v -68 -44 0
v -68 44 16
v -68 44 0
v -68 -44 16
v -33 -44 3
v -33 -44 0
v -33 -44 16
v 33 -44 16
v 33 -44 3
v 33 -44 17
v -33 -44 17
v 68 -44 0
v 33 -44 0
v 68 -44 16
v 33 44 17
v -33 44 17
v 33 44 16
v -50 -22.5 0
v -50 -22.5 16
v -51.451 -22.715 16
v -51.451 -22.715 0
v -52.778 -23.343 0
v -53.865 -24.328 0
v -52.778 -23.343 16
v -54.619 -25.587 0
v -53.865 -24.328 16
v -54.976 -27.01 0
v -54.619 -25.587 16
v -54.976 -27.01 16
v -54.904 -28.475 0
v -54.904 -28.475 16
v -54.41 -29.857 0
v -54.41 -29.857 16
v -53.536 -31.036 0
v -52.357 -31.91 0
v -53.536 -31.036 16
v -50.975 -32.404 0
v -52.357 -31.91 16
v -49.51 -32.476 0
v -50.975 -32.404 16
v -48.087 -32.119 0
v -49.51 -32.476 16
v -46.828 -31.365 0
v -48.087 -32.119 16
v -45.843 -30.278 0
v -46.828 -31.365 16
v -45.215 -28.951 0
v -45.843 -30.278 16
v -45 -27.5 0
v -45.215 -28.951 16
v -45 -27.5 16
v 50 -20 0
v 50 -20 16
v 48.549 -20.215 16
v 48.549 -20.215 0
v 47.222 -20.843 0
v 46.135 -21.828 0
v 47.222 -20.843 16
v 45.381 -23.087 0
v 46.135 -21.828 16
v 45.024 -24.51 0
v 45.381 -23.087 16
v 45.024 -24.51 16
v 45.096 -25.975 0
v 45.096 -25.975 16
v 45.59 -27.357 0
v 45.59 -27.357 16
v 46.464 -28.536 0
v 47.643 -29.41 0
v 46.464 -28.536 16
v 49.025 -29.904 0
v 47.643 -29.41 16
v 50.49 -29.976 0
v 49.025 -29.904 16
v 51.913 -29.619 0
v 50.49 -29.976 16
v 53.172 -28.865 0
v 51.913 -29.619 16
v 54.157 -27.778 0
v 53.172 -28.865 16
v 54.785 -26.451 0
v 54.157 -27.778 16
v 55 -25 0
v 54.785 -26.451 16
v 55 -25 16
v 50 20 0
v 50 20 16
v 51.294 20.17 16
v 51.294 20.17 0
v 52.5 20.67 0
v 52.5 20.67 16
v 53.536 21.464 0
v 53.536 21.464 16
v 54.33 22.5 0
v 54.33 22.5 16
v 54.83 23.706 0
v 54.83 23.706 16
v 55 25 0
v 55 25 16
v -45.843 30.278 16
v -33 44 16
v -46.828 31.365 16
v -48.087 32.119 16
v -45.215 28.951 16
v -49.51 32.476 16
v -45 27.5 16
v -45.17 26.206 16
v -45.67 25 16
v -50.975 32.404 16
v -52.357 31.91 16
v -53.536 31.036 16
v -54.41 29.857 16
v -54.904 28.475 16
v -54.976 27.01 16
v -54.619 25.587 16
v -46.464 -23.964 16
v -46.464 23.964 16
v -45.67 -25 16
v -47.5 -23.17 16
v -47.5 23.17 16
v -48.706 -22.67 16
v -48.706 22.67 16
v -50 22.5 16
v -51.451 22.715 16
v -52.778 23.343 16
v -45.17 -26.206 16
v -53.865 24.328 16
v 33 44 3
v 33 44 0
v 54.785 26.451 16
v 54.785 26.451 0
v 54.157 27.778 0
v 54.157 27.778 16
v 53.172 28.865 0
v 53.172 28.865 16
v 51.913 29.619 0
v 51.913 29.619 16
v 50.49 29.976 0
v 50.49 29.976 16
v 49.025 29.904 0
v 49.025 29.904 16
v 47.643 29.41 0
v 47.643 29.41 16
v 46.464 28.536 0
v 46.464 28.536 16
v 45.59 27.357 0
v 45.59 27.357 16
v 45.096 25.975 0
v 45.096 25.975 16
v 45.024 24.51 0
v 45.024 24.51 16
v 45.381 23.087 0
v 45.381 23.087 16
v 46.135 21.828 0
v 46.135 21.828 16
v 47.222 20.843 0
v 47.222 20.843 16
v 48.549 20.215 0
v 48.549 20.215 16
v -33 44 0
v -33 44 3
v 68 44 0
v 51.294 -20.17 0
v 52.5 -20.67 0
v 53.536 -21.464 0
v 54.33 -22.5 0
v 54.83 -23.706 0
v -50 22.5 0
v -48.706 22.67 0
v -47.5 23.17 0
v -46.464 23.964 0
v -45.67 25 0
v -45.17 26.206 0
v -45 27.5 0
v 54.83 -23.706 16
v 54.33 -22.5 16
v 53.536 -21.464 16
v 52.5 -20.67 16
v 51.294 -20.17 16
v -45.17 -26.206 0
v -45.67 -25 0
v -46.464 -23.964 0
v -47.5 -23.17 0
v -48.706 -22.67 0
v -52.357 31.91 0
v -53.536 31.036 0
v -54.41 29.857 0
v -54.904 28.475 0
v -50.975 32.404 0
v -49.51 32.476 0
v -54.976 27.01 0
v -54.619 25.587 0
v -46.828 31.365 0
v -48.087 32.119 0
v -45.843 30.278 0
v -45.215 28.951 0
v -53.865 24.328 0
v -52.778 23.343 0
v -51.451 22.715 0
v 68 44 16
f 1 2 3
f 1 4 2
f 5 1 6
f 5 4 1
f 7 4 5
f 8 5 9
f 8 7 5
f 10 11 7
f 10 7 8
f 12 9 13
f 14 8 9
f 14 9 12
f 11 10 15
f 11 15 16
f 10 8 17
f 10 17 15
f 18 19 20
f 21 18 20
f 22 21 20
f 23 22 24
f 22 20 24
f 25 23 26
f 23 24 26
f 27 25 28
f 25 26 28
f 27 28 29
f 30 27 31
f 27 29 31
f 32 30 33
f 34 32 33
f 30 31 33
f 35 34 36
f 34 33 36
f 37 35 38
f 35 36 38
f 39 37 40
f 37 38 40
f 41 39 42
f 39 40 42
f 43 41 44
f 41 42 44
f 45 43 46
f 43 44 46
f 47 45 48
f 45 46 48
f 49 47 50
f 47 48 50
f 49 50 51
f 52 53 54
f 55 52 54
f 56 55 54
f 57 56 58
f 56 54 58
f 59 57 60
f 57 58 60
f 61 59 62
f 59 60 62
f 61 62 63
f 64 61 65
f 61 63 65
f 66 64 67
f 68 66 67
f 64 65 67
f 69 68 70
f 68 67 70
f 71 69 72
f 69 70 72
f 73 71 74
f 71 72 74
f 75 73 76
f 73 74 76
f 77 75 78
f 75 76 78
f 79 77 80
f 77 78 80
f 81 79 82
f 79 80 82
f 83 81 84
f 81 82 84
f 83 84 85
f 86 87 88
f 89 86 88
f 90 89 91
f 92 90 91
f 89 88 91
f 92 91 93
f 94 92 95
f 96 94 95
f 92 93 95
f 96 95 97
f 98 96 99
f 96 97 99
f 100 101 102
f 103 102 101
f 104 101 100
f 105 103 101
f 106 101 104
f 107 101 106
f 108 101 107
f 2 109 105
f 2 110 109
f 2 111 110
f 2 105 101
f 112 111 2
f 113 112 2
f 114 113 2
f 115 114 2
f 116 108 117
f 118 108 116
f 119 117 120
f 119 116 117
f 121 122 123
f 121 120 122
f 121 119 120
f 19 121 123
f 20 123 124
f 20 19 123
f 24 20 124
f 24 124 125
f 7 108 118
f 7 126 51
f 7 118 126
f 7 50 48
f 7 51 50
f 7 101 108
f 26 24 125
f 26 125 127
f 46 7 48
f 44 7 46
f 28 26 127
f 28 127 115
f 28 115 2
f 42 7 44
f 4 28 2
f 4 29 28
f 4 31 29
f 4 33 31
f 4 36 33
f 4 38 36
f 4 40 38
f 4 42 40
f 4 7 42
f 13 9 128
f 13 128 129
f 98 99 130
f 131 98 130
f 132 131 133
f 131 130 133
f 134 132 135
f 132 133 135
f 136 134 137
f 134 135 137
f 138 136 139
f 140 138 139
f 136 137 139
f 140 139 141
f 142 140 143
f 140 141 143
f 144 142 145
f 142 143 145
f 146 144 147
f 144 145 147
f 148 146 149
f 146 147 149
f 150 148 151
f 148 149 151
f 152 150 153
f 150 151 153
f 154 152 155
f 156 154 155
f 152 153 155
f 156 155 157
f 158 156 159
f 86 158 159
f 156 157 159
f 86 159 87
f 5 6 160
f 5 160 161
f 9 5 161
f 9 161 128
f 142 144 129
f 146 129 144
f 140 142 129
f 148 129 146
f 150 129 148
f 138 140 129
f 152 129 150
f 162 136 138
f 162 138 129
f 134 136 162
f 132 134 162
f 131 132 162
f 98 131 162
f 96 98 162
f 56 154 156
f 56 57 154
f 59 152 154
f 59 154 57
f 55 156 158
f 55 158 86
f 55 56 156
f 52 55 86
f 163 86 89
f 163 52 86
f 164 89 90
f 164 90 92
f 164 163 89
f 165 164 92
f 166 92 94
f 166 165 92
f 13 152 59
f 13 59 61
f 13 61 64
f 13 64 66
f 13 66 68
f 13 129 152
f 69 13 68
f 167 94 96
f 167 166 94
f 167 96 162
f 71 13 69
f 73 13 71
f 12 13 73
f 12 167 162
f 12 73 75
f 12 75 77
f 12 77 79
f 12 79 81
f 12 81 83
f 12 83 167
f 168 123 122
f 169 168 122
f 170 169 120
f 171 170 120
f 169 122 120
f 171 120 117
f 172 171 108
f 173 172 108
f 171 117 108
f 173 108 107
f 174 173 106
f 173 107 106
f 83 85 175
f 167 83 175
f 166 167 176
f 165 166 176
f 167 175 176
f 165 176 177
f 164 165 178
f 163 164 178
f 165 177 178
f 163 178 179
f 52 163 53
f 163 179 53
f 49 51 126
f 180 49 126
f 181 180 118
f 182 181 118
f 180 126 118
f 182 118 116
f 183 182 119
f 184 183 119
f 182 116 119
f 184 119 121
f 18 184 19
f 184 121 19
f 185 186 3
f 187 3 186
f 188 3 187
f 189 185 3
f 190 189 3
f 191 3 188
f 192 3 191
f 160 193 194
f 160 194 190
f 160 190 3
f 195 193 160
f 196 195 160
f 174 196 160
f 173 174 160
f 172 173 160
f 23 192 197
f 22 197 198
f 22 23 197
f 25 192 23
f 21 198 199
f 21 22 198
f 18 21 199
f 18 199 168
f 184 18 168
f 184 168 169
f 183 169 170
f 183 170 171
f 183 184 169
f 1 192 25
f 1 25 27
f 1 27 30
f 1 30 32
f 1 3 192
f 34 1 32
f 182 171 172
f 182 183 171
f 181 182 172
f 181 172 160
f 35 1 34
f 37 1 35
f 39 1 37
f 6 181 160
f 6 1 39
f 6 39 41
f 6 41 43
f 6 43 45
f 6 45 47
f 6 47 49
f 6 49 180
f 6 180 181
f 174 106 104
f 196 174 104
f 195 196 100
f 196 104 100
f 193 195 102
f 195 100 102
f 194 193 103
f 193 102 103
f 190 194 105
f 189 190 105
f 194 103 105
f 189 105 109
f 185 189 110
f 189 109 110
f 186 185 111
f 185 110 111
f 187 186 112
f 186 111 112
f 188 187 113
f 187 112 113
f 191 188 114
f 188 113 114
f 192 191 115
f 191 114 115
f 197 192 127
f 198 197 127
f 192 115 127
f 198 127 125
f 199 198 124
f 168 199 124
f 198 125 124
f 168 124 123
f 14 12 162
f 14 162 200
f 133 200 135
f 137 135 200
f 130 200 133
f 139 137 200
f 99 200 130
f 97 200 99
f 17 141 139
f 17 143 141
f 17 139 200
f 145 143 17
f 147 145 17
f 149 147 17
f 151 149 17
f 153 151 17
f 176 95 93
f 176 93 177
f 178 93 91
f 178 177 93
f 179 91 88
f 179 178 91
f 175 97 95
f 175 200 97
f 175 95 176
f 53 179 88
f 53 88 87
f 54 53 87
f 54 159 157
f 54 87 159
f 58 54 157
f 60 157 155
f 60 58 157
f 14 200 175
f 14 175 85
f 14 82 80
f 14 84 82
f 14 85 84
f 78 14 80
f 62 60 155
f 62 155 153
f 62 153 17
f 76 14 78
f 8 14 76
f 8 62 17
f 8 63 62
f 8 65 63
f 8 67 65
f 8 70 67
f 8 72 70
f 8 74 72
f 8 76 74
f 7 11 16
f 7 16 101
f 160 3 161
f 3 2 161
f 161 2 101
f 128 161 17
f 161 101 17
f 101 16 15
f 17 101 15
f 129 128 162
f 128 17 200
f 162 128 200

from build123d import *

# Parameters (mm, degrees)
F1_DEPTH = 44
F5_DEPTH = 25
F6_DEPTH = 25


with BuildPart() as f1:
    # F0 (on Front) → F1 (new body, symmetric)
    with BuildSketch(Plane.XZ):
        Polygon((-68, 0), (-33, 0), (-33, 3), (-33, 16), (-68, 16), align=None)
        Polygon((-33, 16), (-33, 3), (33, 3), (33, 16), (33, 17), (-33, 17), align=None)
        Polygon((33, 16), (33, 3), (33, 0), (68, 0), (68, 16), align=None)
    extrude(amount=F1_DEPTH, both=True)

    # F3 (on offset) → F5 (cut)
    with BuildSketch(Plane.XY.offset(16)):
        with BuildLine():
            ThreePointArc((55, 25), (46.4644660941, 28.5355339059), (50, 20))
            ThreePointArc((50, 20), (53.5355339059, 21.4644660941), (55, 25))
        make_face()
        with BuildLine():
            ThreePointArc((55, -25), (53.5355339059, -21.4644660941), (50, -20))
            ThreePointArc((50, -20), (46.4644660941, -28.5355339059), (55, -25))
        make_face()
    extrude(amount=-F5_DEPTH, mode=Mode.SUBTRACT)

    # F4 (on face) → F6 (cut)
    with BuildSketch(Plane.XY.offset(16)):
        with BuildLine():
            ThreePointArc((-45, -27.5), (-46.4644660941, -23.9644660941), (-50, -22.5))
            ThreePointArc((-50, -22.5), (-53.5355339059, -31.0355339059), (-45, -27.5))
        make_face()
        with BuildLine():
            ThreePointArc((-45, 27.5), (-53.5355339059, 31.0355339059), (-50, 22.5))
            ThreePointArc((-50, 22.5), (-46.4644660941, 23.9644660941), (-45, 27.5))
        make_face()
    extrude(amount=-F6_DEPTH, mode=Mode.SUBTRACT)


solid = f1.part
